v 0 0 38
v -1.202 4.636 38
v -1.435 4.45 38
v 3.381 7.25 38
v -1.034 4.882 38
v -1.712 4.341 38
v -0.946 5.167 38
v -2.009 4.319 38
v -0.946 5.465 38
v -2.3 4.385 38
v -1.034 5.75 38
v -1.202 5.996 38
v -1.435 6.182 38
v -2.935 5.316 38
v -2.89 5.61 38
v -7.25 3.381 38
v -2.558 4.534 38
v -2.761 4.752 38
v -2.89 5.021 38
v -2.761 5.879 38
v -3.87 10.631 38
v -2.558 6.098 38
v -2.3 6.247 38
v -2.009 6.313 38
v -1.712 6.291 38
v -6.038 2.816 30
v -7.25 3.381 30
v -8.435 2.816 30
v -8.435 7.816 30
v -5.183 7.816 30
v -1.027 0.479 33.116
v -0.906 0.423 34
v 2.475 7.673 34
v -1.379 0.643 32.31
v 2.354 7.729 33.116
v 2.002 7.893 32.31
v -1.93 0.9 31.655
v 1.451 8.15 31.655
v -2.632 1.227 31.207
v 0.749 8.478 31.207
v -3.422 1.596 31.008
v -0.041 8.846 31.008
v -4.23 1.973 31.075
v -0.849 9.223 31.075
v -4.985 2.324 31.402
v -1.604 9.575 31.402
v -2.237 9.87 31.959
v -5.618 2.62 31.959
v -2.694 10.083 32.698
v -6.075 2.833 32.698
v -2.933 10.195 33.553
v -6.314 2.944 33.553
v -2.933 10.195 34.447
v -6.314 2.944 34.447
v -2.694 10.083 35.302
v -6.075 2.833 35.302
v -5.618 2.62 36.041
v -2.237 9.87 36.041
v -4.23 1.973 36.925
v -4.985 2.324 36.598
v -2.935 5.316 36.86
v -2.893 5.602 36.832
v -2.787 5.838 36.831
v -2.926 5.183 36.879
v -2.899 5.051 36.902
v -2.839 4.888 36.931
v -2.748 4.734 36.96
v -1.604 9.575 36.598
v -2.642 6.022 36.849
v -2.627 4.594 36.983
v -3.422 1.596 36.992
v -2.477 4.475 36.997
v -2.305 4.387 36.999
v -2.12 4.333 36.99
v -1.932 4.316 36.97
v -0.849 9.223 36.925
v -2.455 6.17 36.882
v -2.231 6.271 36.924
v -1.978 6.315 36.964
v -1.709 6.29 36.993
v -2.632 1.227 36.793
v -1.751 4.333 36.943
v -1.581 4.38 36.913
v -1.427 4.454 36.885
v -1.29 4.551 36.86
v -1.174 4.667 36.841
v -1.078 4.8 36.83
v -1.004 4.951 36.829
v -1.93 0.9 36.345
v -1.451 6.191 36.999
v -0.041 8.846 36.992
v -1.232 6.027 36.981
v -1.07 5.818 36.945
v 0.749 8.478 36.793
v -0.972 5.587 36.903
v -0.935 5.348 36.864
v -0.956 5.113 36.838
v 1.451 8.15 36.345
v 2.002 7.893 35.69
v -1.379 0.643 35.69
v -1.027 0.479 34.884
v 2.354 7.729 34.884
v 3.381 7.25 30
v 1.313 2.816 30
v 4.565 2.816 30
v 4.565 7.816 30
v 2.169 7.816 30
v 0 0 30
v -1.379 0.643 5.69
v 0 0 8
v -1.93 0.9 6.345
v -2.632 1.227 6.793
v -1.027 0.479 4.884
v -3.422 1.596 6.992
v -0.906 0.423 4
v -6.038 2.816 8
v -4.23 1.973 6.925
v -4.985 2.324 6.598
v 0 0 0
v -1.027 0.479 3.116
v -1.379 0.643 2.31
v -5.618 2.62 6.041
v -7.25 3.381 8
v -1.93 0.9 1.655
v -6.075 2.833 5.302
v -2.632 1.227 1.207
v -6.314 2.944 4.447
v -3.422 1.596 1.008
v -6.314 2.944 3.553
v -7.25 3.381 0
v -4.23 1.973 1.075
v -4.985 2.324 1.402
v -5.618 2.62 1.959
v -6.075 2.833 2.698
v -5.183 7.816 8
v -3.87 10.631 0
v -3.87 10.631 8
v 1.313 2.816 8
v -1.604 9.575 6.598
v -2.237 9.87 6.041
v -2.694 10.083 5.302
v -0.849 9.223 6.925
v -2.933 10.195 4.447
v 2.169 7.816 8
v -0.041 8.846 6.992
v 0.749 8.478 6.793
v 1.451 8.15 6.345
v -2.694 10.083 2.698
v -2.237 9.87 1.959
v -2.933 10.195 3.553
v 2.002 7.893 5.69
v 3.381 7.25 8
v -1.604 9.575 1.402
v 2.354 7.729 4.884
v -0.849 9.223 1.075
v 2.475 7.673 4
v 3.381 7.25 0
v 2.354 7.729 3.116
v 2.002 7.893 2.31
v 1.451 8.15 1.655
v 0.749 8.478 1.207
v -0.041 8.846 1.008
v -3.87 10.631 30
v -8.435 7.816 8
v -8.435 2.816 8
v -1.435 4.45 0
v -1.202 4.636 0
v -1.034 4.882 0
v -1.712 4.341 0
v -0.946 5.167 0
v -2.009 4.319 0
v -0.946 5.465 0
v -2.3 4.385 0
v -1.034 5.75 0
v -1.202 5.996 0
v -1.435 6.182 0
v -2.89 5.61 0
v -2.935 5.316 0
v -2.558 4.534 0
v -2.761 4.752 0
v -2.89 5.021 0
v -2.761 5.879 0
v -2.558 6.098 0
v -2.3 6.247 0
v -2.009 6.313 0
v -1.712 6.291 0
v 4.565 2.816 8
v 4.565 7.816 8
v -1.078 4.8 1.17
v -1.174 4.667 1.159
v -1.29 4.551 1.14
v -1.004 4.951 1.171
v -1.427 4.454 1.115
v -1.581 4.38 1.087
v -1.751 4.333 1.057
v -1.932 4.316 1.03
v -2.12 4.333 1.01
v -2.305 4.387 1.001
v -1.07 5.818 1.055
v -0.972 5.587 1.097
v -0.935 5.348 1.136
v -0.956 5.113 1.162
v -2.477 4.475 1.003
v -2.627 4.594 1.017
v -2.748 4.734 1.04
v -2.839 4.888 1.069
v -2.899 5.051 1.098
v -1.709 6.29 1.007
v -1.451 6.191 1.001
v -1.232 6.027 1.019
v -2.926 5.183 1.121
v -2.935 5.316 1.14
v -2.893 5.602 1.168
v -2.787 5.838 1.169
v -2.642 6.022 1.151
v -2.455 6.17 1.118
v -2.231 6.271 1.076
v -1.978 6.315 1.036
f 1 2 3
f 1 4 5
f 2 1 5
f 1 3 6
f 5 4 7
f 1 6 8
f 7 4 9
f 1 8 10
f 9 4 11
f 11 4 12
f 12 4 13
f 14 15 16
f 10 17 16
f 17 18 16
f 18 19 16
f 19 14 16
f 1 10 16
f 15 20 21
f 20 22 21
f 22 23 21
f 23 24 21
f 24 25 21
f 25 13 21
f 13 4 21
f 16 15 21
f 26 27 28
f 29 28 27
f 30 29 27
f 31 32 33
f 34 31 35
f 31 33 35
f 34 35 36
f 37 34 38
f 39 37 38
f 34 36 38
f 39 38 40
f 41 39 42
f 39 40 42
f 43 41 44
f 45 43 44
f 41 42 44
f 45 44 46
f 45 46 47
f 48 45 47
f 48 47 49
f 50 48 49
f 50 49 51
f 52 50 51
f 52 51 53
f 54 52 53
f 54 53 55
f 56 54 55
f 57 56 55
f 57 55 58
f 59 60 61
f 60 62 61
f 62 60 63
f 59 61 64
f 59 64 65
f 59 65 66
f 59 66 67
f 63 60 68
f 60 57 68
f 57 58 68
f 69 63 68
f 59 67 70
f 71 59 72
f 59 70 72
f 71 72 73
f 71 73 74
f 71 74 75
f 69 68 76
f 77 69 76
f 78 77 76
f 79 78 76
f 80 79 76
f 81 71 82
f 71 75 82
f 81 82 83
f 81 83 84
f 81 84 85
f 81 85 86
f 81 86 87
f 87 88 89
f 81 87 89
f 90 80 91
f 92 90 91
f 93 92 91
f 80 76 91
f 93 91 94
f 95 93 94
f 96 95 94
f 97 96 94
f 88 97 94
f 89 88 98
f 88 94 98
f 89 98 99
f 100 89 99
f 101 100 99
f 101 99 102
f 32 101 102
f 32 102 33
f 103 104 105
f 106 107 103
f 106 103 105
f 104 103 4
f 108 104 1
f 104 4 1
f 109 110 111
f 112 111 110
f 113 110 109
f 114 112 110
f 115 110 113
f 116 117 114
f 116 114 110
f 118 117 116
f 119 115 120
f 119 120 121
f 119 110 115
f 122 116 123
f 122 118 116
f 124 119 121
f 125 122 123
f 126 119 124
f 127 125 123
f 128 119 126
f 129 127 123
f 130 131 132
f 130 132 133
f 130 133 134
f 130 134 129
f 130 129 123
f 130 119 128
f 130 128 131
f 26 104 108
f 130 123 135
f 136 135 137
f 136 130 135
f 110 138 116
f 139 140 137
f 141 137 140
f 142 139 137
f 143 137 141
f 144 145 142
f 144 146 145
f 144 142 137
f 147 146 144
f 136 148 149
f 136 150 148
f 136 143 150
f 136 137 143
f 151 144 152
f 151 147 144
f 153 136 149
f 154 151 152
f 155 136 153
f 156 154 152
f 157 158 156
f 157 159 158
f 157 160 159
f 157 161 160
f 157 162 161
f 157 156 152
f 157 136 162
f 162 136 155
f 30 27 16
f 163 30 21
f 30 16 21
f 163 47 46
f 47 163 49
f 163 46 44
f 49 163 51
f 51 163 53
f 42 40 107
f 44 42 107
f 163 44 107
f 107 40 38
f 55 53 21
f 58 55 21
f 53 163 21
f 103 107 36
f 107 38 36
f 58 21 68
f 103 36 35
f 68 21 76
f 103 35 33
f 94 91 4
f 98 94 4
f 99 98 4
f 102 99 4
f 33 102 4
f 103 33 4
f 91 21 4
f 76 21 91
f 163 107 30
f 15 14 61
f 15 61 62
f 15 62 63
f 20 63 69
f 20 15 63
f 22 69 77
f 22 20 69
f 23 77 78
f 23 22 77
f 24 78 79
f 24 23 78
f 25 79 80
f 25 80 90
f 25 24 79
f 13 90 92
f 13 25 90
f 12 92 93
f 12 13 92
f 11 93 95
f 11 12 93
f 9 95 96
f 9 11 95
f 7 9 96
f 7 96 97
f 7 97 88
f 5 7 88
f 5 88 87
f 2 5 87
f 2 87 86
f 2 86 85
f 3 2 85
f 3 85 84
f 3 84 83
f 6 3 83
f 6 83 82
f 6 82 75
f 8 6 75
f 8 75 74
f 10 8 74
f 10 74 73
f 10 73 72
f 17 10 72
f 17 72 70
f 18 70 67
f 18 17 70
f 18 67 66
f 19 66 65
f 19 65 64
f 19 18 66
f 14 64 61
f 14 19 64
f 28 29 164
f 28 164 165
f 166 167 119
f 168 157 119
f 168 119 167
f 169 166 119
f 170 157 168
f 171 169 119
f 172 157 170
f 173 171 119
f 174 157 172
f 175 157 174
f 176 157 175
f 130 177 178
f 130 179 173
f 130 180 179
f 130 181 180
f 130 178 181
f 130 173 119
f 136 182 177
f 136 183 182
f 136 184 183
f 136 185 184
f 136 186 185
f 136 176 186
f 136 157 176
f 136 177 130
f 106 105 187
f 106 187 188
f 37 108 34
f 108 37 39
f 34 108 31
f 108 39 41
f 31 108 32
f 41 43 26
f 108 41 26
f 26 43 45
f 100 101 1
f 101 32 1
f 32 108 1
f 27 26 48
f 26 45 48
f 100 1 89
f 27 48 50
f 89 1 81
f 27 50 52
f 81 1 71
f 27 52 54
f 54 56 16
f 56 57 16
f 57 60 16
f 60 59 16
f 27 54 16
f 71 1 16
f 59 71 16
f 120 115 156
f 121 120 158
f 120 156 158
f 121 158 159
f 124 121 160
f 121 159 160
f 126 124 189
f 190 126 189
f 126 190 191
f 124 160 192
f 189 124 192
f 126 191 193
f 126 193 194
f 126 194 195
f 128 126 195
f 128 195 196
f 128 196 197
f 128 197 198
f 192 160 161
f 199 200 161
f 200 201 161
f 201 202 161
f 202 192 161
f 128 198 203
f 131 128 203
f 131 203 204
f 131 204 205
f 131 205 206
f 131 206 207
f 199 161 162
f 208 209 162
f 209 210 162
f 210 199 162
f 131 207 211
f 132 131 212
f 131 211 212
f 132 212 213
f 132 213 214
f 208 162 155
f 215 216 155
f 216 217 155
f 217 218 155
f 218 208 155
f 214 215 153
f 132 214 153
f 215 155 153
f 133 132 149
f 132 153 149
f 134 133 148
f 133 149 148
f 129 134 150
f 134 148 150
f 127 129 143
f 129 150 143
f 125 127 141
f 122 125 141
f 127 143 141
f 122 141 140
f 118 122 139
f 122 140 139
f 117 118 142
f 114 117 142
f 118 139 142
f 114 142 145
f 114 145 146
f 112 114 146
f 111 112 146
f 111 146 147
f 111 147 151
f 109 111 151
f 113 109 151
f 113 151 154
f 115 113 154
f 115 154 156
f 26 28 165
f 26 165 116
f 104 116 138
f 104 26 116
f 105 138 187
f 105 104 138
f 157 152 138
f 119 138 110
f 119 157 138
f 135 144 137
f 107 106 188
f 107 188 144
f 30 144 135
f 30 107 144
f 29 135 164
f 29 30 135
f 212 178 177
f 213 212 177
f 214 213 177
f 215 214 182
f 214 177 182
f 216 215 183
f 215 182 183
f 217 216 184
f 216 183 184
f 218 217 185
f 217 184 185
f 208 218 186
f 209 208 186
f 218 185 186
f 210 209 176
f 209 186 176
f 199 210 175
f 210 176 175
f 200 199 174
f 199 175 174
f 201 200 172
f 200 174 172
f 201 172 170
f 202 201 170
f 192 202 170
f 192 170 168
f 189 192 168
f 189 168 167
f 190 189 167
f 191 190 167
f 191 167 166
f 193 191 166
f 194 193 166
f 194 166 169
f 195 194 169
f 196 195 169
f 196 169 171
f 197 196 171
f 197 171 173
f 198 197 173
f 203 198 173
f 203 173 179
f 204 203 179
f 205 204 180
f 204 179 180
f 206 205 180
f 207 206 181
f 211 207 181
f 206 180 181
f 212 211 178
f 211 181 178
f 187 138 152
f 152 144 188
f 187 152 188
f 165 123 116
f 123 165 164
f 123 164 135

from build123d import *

# Parameters (mm, degrees)
BOSS_EXTRUDE1_DEPTH = 8
BOSS_EXTRUDE2_DEPTH = 11
BOSS_EXTRUDE3_DEPTH = 11
SKETCH5_R           = 1
CUT_EXTRUDE2_DEPTH  = 4
CUT_EXTRUDE1_REACH  = 13.565
SKETCH4_R           = 3


with BuildPart() as part:
    # Sketch1 → Boss-Extrude1 (new body)
    with BuildSketch(Plane.XY):
        Polygon((0, 0), (-7.250462296, 3.380946094), (-3.869516202, 10.63140839), (3.380946094, 7.250462296), align=None)
    extrude(amount=BOSS_EXTRUDE1_DEPTH)

    # Sketch2 → Boss-Extrude2 (add)
    with BuildSketch(Plane.XY.offset(8)):
        Polygon((-6.038297133, 2.815704195), (1.312984429, 2.815704195), (3.380946094, 7.250462296), (2.16878093, 7.815704195), (-5.182500632, 7.815704195), (-7.250462296, 3.380946094), align=None)
    extrude(amount=BOSS_EXTRUDE2_DEPTH)

    # Sketch3 → Boss-Extrude3 (add)
    with BuildSketch(Plane.XY.offset(8)):
        Polygon((-5.182500632, 7.815704195), (-8.434758101, 7.815704195), (-8.434758101, 2.815704195), (-6.038297133, 2.815704195), (-7.250462296, 3.380946094), align=None)
        Polygon((1.312984429, 2.815704195), (4.565241899, 2.815704195), (4.565241899, 7.815704195), (2.16878093, 7.815704195), (3.380946094, 7.250462296), align=None)
    extrude(amount=BOSS_EXTRUDE3_DEPTH)

    # Sketch5 → Cut-Extrude2 (cut)
    with BuildSketch(Plane(origin=(0, 0, 0), x_dir=(-1, 0, 0), z_dir=(0, 0, -1))):
        with Locations((1.934758101, 5.315704195)):
            Circle(SKETCH5_R)
    extrude(amount=-CUT_EXTRUDE2_DEPTH, mode=Mode.SUBTRACT)

    # Mirror2: part across face


with BuildPart() as part_1:
    add(part.part)
    add(part.part.mirror(Plane(origin=(-1.934758101, 5.315704195, 19), x_dir=(1, 0, 0), z_dir=(0, 0, 1))))

    # Sketch4 → Cut-Extrude1 (cut, up to next)
    with BuildSketch(Plane(origin=(3.380946094, 7.250462296, 0), x_dir=(0.906307787, -0.422618262, 0), z_dir=(0.422618262, 0.906307787, 0)), mode=Mode.PRIVATE) as cut_extrude1_sk1:
        with Locations((-4, -4)):
            Circle(SKETCH4_R)
    cut_extrude1_tool1 = extrude(cut_extrude1_sk1.sketch, amount=-CUT_EXTRUDE1_REACH, mode=Mode.PRIVATE) & part_1.part
    add(cut_extrude1_tool1.solids().sort_by_distance((-0.244285, 8.940935, 4))[0], mode=Mode.SUBTRACT)
    # Sketch4 → Cut-Extrude1 (cut, up to next)
    with BuildSketch(Plane(origin=(3.380946094, 7.250462296, 0), x_dir=(0.906307787, -0.422618262, 0), z_dir=(0.422618262, 0.906307787, 0)), mode=Mode.PRIVATE) as cut_extrude1_sk2:
        with Locations((-4, -34)):
            Circle(SKETCH4_R)
    cut_extrude1_tool2 = extrude(cut_extrude1_sk2.sketch, amount=-CUT_EXTRUDE1_REACH, mode=Mode.PRIVATE) & part_1.part
    add(cut_extrude1_tool2.solids().sort_by_distance((-0.244285, 8.940935, 34))[0], mode=Mode.SUBTRACT)


solid = part_1.part
